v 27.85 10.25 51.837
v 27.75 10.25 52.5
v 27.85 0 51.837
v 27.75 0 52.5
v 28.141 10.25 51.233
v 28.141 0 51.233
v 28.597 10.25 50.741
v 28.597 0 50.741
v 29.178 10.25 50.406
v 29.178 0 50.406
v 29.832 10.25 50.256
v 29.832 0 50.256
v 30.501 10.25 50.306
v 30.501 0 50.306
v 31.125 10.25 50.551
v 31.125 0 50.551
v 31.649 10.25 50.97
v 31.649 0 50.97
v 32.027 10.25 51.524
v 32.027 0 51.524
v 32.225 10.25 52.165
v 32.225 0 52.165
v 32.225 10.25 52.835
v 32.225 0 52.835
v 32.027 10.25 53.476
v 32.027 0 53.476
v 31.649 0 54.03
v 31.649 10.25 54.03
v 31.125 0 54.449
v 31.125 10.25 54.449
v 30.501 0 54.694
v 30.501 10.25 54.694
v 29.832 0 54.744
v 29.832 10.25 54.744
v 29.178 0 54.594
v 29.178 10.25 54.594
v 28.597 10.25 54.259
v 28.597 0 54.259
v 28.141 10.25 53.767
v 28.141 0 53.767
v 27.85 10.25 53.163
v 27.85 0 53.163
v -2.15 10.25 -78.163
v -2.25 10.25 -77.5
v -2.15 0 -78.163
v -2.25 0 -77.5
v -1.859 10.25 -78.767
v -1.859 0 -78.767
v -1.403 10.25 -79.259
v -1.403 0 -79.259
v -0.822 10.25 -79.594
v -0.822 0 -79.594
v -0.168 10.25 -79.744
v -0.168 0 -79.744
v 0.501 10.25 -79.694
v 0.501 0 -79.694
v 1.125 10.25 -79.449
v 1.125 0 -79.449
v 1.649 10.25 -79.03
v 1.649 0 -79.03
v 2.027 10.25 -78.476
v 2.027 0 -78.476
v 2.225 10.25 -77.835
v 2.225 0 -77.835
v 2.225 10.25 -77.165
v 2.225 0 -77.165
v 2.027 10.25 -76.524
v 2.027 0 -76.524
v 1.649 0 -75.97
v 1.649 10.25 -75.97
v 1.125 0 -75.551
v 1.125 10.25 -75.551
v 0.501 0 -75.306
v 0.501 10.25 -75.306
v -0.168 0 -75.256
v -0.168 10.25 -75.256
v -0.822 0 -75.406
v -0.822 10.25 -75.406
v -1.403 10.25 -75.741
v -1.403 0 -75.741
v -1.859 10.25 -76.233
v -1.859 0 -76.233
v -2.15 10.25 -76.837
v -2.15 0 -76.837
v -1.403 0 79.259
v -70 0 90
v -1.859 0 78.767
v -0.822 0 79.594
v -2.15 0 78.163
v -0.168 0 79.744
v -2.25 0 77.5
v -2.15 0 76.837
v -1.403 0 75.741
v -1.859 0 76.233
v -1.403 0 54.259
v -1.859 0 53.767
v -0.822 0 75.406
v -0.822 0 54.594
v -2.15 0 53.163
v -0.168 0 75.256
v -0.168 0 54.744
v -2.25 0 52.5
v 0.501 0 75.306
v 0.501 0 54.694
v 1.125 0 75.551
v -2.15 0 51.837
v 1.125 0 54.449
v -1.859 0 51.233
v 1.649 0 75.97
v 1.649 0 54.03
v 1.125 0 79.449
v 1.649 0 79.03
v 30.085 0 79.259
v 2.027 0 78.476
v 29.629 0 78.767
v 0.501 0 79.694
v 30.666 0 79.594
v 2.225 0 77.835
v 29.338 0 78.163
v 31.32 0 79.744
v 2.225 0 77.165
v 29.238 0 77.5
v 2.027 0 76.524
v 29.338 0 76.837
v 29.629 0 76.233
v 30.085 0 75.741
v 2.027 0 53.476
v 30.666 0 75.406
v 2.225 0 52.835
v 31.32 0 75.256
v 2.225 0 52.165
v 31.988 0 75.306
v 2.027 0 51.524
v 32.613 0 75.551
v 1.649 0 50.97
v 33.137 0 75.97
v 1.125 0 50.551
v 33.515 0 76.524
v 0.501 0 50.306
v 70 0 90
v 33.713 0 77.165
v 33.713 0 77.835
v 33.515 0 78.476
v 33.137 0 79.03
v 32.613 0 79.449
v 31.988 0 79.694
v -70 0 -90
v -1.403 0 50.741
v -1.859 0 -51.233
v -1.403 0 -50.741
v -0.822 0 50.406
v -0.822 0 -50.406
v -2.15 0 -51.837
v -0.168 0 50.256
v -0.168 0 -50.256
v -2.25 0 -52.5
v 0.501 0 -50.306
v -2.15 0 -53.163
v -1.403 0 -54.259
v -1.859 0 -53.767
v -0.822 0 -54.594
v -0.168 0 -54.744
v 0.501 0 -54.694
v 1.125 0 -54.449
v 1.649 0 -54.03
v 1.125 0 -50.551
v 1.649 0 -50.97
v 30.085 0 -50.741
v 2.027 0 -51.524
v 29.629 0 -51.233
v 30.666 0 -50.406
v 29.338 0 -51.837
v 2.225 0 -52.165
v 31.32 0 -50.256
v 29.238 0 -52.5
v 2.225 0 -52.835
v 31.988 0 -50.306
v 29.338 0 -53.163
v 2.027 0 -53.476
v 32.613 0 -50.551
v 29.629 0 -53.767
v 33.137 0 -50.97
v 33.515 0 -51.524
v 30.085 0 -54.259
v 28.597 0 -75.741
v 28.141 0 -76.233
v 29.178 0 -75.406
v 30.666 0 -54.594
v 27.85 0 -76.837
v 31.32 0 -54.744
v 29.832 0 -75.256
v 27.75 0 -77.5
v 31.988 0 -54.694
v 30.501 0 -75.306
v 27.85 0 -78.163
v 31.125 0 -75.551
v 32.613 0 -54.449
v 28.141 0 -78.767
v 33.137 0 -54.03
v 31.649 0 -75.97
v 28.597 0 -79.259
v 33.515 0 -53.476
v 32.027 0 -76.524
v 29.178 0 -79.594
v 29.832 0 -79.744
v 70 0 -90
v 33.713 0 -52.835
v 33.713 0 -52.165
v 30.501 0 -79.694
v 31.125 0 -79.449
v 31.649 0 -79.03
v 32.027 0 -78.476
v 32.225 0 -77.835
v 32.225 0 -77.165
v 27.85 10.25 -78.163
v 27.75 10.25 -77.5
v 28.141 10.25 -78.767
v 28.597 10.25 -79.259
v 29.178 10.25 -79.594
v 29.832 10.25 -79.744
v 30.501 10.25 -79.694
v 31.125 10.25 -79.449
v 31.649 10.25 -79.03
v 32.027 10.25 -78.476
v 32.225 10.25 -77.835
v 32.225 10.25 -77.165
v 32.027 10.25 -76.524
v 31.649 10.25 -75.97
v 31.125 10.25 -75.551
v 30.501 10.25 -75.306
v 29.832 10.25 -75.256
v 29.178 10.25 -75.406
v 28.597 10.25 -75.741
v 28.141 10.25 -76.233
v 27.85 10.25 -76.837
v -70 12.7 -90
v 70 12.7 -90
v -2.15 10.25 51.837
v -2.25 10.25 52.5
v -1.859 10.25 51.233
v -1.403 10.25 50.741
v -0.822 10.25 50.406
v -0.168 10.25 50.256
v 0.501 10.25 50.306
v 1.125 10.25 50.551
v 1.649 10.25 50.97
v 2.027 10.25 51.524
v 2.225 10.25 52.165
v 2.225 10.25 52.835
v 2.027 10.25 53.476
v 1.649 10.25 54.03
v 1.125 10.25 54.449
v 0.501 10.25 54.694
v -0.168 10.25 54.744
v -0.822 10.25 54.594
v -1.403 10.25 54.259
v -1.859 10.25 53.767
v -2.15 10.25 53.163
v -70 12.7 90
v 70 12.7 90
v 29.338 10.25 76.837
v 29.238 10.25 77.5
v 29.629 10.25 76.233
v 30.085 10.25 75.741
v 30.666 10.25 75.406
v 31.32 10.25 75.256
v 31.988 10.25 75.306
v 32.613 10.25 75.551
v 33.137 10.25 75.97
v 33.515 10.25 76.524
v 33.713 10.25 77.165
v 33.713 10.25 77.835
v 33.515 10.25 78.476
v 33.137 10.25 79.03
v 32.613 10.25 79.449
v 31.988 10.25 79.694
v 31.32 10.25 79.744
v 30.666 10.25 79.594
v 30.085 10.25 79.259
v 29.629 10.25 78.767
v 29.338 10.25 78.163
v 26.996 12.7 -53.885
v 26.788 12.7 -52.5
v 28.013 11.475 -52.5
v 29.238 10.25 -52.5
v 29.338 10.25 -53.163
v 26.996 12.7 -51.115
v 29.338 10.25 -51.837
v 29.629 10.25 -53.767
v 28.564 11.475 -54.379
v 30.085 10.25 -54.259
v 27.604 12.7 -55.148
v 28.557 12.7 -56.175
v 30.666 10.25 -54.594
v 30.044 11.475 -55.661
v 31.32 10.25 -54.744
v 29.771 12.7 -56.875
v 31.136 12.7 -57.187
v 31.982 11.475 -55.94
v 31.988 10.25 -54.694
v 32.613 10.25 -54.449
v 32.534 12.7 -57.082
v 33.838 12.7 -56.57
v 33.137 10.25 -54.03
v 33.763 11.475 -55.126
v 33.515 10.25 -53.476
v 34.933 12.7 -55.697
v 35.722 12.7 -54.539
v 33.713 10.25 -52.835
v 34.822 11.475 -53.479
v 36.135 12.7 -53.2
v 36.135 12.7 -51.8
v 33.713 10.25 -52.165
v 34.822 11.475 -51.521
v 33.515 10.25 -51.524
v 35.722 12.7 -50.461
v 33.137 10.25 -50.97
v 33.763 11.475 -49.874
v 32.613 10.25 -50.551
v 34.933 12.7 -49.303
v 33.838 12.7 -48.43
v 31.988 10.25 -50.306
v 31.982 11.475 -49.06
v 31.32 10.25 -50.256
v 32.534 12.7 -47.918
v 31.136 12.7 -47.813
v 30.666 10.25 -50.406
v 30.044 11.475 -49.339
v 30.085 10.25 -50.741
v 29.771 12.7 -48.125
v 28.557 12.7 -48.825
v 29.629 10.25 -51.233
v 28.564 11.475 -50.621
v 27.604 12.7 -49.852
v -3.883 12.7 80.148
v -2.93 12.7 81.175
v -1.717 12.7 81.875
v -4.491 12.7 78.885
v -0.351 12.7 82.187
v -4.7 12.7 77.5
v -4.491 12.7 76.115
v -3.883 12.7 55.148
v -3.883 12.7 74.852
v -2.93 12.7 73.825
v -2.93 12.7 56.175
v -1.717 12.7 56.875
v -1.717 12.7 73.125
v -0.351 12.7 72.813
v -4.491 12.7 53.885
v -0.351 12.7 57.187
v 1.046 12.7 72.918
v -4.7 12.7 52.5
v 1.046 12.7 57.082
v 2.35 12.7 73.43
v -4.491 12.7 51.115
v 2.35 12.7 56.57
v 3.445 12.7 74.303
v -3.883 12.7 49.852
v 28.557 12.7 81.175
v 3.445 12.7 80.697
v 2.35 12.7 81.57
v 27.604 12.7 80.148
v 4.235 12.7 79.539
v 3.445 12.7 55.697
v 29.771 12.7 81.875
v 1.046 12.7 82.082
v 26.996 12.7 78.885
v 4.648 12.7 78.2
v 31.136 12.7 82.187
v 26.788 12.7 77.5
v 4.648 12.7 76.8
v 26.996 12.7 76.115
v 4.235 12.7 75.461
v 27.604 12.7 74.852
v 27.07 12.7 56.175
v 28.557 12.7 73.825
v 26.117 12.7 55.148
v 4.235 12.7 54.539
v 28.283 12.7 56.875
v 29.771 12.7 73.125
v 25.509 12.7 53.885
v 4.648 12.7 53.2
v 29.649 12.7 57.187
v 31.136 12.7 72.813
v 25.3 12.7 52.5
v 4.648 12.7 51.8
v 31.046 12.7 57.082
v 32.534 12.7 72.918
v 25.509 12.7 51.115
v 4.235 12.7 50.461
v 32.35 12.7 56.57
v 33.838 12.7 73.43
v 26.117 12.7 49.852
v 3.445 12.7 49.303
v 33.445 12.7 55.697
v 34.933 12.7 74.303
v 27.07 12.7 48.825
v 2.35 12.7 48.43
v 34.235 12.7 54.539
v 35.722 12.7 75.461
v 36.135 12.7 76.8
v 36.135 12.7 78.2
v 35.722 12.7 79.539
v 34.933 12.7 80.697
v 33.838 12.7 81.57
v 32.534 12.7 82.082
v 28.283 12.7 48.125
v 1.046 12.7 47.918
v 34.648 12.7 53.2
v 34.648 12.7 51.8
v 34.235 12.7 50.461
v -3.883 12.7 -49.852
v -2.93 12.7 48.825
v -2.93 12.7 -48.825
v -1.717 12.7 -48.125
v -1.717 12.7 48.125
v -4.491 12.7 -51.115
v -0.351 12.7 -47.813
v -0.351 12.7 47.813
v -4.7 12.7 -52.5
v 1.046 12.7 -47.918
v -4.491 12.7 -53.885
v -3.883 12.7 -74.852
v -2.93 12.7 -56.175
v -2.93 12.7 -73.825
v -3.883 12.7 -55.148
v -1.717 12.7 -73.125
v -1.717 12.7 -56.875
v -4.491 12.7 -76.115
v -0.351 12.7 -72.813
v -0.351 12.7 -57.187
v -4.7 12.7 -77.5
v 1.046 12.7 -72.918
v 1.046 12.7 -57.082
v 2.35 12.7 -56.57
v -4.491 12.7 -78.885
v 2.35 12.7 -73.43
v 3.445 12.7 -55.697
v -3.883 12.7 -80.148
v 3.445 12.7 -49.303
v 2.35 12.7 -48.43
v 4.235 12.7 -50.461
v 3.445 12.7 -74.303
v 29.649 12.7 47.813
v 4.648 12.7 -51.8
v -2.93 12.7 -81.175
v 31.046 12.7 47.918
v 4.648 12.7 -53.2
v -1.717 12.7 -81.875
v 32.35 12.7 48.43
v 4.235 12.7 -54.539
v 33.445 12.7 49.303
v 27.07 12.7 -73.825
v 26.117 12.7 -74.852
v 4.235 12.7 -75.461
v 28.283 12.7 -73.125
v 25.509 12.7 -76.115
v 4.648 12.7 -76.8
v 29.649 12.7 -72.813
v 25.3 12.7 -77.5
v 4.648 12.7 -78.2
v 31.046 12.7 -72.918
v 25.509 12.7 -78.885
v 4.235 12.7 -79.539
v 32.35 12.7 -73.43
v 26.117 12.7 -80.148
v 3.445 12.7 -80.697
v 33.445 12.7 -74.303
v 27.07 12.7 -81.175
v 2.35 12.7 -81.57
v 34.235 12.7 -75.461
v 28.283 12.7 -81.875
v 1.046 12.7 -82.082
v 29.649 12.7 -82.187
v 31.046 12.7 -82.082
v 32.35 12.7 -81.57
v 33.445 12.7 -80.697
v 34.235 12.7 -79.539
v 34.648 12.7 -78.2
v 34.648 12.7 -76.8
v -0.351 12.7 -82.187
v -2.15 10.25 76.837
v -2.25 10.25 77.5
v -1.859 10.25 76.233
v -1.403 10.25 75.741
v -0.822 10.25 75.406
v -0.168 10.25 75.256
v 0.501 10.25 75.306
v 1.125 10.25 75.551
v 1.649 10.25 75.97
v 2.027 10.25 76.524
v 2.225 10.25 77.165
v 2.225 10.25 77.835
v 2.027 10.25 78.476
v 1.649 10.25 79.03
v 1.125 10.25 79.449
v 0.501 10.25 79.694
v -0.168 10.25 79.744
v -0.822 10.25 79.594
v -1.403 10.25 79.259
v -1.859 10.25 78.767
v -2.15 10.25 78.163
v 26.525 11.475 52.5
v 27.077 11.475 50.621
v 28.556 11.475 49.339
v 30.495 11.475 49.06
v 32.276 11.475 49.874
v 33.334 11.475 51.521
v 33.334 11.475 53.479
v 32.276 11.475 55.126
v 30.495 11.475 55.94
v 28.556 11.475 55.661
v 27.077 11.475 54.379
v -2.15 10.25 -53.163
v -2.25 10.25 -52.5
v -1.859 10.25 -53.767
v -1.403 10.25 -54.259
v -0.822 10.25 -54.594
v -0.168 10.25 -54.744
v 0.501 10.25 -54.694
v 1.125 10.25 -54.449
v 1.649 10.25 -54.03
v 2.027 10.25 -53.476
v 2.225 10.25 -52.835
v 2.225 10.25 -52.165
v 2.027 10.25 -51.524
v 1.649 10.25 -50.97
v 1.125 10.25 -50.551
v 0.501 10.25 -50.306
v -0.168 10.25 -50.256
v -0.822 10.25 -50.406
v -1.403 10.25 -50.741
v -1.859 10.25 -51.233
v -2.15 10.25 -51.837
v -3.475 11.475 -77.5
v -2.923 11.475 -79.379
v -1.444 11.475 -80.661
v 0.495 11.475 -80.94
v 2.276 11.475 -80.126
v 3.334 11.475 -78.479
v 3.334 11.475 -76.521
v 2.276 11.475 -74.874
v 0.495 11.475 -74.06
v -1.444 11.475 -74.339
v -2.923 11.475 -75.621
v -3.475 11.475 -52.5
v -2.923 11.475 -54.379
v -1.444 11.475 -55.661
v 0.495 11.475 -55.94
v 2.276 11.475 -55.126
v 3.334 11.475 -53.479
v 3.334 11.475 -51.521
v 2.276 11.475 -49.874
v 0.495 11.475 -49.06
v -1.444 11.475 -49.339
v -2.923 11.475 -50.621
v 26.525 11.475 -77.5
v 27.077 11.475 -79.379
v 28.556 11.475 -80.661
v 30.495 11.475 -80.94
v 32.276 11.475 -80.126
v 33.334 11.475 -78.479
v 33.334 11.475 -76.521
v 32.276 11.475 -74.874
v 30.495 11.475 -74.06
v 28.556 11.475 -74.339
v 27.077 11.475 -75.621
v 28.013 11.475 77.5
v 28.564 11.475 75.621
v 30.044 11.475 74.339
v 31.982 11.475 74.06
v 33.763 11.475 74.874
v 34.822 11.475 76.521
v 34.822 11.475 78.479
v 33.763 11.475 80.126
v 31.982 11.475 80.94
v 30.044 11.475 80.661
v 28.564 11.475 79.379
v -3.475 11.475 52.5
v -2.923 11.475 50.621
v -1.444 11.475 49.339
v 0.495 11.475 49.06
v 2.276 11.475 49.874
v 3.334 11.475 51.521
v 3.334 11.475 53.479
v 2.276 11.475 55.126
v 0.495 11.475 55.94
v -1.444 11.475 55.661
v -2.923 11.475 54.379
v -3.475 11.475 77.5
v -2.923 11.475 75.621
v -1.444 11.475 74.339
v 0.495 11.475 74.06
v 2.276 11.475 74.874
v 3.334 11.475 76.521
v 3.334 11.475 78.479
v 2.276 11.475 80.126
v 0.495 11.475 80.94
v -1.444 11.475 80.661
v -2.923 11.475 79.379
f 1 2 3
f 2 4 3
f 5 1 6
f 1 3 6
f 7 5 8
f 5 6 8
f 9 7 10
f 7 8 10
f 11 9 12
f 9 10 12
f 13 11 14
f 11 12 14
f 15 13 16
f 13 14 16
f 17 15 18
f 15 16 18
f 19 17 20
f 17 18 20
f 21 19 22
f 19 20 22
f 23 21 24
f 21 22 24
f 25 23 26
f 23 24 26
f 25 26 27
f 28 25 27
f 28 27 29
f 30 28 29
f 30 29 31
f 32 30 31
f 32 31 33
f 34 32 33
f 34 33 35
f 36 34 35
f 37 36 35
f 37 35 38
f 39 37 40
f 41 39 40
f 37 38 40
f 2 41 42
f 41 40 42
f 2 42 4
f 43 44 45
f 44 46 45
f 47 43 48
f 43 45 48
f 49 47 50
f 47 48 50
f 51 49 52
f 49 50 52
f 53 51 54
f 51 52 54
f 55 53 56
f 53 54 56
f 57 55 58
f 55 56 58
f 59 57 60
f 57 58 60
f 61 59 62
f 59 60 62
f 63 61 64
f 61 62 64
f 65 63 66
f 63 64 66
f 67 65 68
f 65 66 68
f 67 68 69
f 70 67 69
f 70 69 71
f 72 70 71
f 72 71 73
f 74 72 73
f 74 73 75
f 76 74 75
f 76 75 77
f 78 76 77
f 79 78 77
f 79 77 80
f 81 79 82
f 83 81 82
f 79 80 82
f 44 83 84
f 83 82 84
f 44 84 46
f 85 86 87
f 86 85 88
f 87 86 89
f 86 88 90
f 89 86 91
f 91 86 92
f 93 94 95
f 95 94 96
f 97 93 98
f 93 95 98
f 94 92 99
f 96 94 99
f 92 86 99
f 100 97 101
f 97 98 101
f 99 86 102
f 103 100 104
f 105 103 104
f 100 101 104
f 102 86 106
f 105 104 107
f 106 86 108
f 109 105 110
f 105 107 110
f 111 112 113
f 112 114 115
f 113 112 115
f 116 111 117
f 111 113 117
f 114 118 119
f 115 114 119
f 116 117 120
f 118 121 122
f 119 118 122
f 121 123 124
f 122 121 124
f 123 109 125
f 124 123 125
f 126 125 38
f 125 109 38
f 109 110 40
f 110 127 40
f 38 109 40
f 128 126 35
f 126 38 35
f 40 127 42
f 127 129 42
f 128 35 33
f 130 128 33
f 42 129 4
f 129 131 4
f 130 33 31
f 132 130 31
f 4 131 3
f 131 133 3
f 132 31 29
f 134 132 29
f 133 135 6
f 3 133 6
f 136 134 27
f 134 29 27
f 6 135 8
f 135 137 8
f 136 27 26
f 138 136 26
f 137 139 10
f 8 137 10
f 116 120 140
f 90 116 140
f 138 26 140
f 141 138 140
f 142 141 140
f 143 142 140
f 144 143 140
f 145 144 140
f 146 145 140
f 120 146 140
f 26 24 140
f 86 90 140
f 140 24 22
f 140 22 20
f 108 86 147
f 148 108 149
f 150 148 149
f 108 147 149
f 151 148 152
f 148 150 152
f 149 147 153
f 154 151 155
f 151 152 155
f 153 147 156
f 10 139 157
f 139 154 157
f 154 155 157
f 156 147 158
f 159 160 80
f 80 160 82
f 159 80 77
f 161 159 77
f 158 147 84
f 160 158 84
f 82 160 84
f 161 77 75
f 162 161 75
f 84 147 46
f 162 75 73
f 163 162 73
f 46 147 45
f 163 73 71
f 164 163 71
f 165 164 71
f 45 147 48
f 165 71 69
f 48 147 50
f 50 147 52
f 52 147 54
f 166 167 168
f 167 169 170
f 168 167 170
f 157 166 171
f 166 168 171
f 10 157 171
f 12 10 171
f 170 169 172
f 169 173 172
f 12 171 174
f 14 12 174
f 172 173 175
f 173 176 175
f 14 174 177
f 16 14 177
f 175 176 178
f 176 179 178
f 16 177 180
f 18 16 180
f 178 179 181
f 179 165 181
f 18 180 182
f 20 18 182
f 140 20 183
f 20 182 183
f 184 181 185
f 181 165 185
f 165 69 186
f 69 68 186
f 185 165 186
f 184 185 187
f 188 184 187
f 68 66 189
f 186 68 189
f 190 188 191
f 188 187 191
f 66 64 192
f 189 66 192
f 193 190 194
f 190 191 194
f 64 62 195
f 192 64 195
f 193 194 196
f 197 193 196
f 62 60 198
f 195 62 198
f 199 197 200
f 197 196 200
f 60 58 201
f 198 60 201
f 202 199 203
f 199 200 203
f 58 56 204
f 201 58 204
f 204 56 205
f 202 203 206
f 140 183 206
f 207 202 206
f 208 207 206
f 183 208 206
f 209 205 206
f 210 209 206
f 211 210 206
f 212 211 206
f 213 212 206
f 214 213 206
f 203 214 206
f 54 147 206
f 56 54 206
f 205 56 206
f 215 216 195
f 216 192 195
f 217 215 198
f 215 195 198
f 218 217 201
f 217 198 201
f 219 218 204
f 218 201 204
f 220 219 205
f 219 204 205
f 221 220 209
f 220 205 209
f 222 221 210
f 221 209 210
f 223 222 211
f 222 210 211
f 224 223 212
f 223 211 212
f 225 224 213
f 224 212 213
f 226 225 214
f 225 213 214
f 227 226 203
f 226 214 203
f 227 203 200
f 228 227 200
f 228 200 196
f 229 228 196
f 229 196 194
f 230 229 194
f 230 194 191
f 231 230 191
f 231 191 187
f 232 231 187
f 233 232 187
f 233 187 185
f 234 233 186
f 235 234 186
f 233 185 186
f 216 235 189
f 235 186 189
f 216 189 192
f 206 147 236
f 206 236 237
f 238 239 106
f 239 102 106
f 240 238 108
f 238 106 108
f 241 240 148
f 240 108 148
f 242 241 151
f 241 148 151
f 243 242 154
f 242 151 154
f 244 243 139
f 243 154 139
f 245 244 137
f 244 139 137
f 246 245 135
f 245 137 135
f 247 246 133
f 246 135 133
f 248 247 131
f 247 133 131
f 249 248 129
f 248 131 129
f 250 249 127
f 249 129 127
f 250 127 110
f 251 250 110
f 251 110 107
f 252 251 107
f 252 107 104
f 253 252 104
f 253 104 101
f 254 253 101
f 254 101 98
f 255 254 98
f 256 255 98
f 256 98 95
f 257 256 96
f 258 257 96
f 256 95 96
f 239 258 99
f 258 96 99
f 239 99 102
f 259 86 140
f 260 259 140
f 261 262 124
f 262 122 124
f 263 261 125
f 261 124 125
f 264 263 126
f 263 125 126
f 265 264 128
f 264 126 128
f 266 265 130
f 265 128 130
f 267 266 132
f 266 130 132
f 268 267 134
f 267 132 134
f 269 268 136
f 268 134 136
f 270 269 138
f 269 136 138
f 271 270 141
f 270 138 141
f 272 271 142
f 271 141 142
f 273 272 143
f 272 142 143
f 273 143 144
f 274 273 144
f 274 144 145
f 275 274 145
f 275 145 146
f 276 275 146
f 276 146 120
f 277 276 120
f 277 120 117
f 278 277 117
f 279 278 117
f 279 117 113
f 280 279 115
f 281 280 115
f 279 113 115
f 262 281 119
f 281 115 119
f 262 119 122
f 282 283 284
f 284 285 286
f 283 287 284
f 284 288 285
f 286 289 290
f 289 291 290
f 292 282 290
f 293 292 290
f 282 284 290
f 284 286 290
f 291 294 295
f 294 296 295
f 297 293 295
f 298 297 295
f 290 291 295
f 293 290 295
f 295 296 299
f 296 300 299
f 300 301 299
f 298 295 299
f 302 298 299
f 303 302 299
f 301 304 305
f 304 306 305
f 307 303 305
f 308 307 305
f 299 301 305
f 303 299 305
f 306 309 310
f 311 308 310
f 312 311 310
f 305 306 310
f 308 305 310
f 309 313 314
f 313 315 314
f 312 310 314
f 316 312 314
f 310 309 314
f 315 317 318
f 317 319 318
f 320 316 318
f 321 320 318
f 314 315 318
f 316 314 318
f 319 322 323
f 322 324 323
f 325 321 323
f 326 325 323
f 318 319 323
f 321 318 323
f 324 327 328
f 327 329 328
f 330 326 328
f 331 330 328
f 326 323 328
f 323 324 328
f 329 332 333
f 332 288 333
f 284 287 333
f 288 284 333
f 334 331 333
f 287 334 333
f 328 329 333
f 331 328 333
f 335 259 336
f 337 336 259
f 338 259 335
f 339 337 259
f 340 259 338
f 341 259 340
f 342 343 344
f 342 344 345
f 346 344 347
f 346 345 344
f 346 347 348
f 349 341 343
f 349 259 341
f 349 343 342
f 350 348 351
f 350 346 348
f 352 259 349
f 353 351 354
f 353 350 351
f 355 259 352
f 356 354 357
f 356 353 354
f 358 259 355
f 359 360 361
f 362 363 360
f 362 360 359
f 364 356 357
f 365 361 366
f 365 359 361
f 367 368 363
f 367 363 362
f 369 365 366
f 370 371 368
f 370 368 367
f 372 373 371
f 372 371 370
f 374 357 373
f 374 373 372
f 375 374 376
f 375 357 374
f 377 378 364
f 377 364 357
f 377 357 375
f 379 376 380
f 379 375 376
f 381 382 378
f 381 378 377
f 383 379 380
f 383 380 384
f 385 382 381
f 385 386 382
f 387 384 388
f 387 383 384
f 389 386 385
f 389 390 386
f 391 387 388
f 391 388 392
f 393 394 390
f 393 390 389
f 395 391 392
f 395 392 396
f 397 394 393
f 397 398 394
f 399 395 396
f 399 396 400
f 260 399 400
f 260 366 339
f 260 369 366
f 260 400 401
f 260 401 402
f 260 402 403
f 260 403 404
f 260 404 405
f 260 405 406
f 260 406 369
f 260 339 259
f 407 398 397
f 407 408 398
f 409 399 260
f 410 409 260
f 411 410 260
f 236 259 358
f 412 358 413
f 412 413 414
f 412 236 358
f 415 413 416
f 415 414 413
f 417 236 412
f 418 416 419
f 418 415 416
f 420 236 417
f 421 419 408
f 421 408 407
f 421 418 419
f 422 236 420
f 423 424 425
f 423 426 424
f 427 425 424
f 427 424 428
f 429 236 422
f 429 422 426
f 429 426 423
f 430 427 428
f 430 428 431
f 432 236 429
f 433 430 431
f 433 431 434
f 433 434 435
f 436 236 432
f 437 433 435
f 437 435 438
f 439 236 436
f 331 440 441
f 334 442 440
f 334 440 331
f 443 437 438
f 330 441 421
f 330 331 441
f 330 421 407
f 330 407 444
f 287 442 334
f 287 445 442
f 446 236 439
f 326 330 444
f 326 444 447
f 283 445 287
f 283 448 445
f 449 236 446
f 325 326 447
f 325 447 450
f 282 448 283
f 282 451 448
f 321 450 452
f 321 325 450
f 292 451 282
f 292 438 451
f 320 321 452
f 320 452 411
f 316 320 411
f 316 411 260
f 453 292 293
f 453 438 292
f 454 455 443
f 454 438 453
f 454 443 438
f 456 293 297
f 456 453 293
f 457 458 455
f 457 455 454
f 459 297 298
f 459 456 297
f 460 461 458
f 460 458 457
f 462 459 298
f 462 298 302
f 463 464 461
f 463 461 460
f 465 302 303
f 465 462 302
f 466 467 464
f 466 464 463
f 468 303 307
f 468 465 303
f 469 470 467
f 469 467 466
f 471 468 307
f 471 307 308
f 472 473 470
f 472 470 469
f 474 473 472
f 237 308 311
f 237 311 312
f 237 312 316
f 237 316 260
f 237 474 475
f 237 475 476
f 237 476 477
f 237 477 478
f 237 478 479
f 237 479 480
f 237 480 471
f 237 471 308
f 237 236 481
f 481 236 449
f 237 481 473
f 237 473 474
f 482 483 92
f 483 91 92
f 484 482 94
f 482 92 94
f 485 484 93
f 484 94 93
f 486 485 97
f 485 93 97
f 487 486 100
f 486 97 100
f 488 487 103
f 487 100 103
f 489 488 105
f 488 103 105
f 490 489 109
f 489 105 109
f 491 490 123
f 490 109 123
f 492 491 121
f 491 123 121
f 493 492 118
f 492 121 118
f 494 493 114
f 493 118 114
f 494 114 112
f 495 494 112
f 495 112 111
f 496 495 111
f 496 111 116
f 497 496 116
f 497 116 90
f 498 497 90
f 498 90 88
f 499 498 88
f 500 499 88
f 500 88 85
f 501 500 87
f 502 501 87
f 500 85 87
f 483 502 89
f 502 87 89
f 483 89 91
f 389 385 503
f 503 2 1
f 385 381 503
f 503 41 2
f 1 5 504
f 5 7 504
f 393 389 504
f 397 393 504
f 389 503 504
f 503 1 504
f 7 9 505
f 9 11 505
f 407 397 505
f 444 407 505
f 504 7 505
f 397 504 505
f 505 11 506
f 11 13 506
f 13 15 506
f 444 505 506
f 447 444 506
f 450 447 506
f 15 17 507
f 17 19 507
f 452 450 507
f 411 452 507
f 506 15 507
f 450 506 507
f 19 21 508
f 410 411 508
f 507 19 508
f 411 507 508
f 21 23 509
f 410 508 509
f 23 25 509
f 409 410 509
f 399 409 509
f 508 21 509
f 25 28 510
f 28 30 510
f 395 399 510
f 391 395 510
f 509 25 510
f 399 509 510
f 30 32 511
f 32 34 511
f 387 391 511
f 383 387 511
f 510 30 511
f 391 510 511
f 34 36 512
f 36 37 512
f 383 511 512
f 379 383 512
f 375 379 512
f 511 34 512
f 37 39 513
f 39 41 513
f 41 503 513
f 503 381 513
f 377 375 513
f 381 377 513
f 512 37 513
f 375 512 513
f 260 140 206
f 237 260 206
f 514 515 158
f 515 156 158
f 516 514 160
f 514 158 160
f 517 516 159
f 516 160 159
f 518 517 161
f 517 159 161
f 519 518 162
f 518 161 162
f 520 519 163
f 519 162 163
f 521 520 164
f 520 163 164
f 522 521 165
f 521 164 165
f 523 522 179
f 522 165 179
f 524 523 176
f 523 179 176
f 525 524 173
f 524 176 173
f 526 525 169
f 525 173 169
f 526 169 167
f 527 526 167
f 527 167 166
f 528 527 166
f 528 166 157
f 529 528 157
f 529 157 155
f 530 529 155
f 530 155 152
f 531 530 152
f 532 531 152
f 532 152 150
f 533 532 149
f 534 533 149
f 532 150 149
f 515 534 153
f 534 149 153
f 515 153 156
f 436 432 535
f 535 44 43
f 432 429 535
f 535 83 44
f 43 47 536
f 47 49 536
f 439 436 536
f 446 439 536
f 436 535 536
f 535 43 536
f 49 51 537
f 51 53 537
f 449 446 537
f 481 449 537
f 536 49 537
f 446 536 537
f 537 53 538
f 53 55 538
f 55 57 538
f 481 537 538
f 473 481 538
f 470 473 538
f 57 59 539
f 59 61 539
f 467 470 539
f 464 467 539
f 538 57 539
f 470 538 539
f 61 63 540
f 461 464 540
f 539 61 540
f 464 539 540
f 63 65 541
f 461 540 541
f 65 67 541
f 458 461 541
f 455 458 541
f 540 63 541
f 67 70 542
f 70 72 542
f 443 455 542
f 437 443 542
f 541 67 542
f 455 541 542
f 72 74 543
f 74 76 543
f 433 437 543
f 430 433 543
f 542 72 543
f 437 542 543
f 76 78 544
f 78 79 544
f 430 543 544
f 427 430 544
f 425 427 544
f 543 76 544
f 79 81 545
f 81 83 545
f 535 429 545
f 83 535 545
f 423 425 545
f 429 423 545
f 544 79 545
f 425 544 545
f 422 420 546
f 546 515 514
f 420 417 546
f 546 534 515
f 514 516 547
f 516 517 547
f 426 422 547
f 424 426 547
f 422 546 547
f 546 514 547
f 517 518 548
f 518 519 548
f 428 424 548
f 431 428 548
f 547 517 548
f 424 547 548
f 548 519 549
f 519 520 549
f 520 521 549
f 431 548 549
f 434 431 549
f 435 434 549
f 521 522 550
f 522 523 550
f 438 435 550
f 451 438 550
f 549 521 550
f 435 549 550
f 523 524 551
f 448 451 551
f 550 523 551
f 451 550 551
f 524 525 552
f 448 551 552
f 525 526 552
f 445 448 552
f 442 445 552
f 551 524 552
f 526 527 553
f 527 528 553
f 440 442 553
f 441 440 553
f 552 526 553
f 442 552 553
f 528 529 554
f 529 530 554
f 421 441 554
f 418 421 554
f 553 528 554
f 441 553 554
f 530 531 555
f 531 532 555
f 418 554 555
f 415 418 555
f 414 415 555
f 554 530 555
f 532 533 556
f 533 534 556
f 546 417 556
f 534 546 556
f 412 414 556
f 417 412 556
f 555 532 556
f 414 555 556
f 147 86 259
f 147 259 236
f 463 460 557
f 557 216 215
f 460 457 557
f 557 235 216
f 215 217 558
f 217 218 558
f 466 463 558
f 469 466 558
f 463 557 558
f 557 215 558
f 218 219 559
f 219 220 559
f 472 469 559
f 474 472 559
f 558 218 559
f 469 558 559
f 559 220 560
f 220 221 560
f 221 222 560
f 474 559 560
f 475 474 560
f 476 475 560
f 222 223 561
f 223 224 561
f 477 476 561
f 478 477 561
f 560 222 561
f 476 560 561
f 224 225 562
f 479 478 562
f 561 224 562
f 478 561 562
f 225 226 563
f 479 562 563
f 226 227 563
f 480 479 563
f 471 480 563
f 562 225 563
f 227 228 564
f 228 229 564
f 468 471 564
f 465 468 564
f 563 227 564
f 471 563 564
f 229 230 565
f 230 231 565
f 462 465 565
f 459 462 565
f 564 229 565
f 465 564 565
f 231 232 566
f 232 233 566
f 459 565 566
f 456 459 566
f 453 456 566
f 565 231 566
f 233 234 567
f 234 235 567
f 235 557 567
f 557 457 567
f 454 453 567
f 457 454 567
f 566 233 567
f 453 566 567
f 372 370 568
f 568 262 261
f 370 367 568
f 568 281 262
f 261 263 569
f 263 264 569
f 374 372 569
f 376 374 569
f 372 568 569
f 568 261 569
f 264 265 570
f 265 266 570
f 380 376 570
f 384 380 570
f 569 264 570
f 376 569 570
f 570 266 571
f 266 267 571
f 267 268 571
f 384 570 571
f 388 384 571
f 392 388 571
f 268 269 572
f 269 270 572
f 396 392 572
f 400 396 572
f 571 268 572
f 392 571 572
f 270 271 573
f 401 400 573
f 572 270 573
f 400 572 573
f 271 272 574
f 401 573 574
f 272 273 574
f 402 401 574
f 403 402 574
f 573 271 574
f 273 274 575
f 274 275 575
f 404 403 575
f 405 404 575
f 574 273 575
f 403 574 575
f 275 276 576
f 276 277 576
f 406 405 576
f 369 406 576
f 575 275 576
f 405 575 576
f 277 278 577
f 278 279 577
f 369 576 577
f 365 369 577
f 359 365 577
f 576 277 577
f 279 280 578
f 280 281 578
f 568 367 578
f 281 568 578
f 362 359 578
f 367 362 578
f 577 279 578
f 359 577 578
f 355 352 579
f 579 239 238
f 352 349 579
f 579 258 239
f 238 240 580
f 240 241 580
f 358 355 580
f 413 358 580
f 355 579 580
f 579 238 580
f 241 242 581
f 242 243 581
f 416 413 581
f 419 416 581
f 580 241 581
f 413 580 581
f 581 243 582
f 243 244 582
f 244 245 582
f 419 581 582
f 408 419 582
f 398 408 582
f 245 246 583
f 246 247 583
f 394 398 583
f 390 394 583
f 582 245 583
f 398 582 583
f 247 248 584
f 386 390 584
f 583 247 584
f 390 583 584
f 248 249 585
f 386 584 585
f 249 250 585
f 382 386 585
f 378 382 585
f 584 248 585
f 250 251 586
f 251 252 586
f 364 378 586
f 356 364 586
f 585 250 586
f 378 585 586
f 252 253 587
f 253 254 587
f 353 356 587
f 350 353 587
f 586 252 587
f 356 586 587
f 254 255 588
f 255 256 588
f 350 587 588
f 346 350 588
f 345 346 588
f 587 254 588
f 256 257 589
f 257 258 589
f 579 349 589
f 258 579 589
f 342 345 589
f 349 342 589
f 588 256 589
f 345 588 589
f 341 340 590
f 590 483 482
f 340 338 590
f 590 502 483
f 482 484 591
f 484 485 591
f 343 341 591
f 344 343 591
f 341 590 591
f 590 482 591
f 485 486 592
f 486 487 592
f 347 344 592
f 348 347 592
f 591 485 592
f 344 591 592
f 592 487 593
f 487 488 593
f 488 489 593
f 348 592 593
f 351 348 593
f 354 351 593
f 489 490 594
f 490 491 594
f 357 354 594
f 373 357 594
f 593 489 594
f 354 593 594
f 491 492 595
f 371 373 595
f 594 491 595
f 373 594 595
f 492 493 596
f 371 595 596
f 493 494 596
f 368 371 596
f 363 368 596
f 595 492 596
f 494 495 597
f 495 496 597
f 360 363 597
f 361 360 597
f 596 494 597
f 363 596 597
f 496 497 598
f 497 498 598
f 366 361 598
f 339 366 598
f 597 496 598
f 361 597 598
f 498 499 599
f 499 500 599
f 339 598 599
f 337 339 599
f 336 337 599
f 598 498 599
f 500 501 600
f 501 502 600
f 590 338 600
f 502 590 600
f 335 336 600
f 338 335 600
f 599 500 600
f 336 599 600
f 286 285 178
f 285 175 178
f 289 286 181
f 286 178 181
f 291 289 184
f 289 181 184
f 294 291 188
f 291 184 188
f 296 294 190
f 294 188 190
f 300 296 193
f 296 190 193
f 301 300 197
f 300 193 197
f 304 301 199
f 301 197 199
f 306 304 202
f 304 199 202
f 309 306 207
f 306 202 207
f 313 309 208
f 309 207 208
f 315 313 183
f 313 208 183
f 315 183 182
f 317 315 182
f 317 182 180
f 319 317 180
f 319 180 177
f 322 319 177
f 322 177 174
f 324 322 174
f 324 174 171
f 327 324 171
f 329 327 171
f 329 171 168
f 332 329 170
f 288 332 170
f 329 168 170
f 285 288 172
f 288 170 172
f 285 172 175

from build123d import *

# Parameters (mm, degrees)
SKETCH1_W                                       = 140
SKETCH1_H                                       = 180
BOSS_EXTRUDE1_DEPTH                             = 12.7
CSK_FOR_M4_FLAT_HEAD_MACHINE_SCREW1_D           = 4.5
CSK_FOR_M4_FLAT_HEAD_MACHINE_SCREW1_CSINK_D     = 9.4
CSK_FOR_M4_FLAT_HEAD_MACHINE_SCREW1_CSINK_ANGLE = 90


with BuildPart() as part:
    # Sketch1 → Boss-Extrude1 (new body)
    with BuildSketch(Plane(origin=(0, 0, 0), x_dir=(1, 0, 0), z_dir=(0, 1, 0))):
        Rectangle(SKETCH1_W, SKETCH1_H)
    extrude(amount=BOSS_EXTRUDE1_DEPTH)

    # CSK for M4 Flat Head Machine Screw1 (through all)
    with Locations(Plane(origin=(0, 12.7, 0), x_dir=(1, 0, 0), z_dir=(0, 1, 0))):
        with Locations((0, -52.5), (30, -52.5), (31.487677762, -77.5), (0, -77.5), (0, 77.5), (30, 77.5), (31.487677762, 52.5), (0, 52.5)):
            CounterSinkHole(CSK_FOR_M4_FLAT_HEAD_MACHINE_SCREW1_D / 2, CSK_FOR_M4_FLAT_HEAD_MACHINE_SCREW1_CSINK_D / 2, counter_sink_angle=CSK_FOR_M4_FLAT_HEAD_MACHINE_SCREW1_CSINK_ANGLE)


solid = part.part
